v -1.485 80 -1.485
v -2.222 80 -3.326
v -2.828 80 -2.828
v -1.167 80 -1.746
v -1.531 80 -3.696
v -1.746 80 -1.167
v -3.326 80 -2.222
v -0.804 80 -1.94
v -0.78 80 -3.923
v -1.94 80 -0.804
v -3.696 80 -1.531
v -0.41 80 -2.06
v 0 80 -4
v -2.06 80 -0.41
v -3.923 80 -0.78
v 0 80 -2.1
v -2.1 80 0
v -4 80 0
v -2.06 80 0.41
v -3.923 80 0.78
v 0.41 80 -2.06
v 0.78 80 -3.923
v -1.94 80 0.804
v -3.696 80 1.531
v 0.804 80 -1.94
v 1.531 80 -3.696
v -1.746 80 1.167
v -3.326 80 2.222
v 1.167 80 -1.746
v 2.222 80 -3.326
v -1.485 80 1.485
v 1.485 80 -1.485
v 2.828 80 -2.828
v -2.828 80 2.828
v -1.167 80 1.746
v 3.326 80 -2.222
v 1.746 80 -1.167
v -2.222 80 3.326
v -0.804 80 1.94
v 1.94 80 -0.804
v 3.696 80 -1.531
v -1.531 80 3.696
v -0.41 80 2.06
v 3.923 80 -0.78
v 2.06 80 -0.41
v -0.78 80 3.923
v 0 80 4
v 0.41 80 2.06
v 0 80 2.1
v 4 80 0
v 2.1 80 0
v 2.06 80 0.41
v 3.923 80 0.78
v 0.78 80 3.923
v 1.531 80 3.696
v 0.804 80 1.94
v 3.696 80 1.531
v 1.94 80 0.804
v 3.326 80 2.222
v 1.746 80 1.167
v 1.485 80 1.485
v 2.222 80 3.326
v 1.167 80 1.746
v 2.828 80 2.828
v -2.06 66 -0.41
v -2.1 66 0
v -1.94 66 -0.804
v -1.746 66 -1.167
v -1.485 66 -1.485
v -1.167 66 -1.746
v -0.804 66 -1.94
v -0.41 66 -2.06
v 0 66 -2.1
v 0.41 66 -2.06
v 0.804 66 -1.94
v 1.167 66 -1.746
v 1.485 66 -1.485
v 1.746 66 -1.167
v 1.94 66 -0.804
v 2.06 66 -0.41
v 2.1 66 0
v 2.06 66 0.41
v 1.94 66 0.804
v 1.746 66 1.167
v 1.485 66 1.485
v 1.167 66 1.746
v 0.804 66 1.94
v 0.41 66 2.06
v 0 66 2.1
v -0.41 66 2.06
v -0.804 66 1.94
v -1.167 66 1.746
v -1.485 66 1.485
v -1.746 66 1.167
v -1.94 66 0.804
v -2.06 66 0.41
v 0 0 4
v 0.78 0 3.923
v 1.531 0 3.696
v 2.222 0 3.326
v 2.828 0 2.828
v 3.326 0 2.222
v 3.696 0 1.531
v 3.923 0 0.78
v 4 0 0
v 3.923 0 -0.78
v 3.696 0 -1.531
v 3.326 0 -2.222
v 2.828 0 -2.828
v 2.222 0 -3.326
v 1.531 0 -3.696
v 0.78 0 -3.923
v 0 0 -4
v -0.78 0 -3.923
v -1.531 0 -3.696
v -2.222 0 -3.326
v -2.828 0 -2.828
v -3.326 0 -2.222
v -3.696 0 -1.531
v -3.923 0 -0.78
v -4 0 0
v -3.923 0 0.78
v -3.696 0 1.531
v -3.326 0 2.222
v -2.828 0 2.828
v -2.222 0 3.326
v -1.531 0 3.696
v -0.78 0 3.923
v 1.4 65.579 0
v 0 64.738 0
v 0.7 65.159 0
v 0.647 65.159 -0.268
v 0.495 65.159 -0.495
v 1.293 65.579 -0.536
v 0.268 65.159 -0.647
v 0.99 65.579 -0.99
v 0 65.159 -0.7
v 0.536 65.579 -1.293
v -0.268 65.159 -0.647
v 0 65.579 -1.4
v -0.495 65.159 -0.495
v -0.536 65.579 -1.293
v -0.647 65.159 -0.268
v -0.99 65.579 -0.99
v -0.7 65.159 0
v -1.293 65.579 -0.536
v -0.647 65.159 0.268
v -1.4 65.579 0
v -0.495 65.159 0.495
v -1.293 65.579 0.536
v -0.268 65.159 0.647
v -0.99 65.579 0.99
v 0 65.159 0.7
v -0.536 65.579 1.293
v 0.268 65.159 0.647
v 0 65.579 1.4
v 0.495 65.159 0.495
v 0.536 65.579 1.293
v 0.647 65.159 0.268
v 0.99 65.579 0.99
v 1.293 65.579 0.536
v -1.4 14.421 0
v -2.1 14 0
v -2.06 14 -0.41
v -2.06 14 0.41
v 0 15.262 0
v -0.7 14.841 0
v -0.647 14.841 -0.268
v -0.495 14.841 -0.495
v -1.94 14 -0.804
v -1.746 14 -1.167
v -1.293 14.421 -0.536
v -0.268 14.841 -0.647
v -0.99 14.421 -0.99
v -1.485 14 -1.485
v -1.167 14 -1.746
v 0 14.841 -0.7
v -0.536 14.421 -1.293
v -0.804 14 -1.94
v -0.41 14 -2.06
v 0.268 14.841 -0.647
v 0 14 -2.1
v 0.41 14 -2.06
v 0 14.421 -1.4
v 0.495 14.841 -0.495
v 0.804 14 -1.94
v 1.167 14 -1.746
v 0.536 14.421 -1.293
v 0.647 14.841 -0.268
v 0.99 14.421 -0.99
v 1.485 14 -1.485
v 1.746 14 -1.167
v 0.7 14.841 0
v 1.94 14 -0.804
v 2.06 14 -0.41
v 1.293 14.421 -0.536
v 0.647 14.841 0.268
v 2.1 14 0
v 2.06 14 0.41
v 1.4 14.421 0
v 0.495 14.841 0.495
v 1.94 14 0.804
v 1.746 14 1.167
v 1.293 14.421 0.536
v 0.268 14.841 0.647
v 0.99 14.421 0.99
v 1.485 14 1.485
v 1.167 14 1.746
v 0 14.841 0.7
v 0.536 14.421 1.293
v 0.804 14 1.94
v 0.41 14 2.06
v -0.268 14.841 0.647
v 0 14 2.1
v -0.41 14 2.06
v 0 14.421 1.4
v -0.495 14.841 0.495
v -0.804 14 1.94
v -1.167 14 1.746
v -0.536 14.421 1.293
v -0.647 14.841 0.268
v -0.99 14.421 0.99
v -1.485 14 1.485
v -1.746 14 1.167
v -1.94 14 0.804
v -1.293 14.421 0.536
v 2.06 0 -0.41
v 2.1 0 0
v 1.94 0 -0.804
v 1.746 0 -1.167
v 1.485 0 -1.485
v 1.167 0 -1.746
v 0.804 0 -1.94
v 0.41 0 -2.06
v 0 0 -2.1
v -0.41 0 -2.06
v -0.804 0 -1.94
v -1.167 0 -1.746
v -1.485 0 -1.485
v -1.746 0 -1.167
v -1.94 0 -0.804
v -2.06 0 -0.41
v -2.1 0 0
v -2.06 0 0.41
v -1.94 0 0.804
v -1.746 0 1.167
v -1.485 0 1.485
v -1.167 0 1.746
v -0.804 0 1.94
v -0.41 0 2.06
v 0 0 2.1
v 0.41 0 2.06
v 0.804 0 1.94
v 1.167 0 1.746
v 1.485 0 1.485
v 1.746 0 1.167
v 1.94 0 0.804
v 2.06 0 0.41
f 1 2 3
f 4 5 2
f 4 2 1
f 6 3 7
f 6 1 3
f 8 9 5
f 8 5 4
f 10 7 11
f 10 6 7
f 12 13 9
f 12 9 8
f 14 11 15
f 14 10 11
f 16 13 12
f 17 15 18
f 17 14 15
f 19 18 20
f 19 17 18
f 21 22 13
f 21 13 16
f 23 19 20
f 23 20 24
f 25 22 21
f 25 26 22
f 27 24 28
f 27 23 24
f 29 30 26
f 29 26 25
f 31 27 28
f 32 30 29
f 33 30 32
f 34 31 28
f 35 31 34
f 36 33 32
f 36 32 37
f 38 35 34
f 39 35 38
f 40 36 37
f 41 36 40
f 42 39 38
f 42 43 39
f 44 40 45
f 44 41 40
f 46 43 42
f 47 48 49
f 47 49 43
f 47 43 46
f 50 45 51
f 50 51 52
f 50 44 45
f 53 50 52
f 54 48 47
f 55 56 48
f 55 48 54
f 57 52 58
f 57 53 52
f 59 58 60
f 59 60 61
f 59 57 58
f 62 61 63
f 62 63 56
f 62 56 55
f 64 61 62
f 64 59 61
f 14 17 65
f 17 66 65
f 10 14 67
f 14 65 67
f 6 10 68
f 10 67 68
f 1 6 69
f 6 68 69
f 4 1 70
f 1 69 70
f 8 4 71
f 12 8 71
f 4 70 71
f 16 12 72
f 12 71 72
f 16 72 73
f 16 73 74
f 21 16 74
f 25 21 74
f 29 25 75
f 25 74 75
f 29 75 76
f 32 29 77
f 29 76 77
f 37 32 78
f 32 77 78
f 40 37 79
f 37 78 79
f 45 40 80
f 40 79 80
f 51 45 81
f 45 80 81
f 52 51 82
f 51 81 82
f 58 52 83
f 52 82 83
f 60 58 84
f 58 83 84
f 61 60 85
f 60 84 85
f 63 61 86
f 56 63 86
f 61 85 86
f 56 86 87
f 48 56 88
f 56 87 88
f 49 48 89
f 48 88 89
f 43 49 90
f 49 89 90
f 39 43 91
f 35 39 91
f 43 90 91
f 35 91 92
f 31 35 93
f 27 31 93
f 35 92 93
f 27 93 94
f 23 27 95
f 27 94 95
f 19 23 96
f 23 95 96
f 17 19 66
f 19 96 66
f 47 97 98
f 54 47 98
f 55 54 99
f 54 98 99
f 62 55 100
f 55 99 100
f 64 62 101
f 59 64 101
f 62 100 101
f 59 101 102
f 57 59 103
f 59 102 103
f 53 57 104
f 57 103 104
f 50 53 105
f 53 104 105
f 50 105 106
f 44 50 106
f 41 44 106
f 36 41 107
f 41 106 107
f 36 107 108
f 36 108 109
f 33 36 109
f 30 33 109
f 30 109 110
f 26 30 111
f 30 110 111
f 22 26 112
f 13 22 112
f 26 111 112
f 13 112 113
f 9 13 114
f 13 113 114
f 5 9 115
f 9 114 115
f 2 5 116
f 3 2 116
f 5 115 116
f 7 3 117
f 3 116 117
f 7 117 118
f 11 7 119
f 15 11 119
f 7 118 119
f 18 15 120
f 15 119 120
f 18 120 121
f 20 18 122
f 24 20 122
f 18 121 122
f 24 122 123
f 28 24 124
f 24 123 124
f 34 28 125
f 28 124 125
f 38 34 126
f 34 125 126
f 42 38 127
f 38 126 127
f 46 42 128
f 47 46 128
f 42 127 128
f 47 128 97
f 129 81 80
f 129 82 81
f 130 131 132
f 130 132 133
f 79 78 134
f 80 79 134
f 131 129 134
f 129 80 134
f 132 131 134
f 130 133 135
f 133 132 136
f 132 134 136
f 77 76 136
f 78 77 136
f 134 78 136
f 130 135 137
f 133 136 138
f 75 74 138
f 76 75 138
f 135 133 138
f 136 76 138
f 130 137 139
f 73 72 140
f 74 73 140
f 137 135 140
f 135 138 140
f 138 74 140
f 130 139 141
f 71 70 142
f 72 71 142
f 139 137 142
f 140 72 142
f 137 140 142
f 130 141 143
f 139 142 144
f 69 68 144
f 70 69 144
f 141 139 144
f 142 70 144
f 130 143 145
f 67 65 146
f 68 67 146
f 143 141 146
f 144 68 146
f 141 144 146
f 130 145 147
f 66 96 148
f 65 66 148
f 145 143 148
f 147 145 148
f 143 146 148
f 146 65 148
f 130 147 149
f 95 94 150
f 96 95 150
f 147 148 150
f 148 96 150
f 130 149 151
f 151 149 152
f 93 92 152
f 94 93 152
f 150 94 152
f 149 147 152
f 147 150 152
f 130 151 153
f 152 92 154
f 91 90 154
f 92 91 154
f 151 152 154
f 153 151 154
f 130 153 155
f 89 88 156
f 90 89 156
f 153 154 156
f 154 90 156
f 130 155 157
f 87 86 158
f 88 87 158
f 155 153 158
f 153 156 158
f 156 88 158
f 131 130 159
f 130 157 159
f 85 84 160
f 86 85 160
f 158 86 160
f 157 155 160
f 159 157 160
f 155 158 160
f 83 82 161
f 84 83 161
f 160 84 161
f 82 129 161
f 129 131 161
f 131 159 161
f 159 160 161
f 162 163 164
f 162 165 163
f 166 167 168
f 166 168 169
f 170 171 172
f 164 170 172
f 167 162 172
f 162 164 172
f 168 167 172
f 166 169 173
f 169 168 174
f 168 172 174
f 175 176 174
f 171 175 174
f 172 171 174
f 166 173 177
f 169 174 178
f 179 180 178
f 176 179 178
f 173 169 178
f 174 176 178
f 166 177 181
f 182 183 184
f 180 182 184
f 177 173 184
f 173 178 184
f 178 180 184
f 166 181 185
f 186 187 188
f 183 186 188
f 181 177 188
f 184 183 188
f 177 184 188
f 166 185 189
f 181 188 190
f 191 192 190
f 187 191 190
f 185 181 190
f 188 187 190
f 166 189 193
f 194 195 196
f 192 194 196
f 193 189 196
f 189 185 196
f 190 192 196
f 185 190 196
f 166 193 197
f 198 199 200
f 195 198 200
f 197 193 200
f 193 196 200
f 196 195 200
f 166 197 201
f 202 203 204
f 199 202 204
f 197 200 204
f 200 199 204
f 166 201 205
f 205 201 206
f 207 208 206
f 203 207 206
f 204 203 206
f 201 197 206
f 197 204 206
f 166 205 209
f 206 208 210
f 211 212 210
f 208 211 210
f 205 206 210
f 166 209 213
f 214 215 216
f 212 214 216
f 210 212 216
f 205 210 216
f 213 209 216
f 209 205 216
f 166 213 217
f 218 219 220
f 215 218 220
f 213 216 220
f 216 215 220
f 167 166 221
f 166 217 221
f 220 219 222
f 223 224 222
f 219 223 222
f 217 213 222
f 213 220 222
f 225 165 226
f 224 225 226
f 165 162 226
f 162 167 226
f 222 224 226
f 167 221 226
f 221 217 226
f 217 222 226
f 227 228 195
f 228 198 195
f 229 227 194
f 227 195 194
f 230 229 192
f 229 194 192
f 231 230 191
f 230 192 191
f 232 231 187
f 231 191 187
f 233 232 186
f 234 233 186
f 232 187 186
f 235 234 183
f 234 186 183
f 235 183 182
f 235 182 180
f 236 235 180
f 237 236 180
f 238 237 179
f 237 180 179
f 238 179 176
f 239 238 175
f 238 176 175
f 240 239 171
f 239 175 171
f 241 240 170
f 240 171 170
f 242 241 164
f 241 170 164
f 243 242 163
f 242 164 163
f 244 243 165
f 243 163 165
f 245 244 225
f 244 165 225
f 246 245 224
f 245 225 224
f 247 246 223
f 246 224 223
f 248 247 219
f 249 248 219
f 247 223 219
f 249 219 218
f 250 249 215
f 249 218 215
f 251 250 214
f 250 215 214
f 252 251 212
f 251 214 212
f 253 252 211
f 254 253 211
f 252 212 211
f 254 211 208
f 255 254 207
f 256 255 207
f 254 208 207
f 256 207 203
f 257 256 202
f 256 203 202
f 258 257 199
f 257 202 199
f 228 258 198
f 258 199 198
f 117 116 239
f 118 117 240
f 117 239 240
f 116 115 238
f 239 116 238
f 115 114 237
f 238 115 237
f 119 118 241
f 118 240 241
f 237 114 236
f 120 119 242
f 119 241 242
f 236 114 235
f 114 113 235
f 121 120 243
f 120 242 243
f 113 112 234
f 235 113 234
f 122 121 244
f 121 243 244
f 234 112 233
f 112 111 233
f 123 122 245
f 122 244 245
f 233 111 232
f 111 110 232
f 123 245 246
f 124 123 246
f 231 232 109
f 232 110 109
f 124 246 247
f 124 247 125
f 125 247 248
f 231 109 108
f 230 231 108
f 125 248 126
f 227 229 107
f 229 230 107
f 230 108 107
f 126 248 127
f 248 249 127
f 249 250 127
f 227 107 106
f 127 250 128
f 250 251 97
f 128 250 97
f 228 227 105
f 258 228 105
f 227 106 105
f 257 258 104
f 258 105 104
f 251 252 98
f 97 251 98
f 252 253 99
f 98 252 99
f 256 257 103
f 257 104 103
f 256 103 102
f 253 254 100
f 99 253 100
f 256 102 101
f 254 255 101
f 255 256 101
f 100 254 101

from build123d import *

# Parameters (mm, degrees)
BOSS_EXTRUDE1_DEPTH       = 80
BOSS_EXTRUDE1_DEPTH_BACK  = 0.0001
SKETCH1_R                 = 4
M5X0_8_TAPPED_HOLE1_D     = 4.2
M5X0_8_TAPPED_HOLE1_DEPTH = 14
M5X0_8_TAPPED_HOLE1_TIP   = 1.2618073
M5X0_8_TAPPED_HOLE2_D     = 4.2
M5X0_8_TAPPED_HOLE2_DEPTH = 14
M5X0_8_TAPPED_HOLE2_TIP   = 1.2618073


with BuildPart() as part:
    # Sketch1 → Boss-Extrude1 (new, two sides: drawn at the far end of the back side and taken through both)
    with BuildSketch(Plane(origin=(0, 0, 0), x_dir=(1, 0, 0), z_dir=(0, 1, 0)).offset(-BOSS_EXTRUDE1_DEPTH_BACK)):
        with Locations(Location((0, 0, 0), (0, 0, 270))):
            Circle(SKETCH1_R)
    extrude(amount=BOSS_EXTRUDE1_DEPTH + BOSS_EXTRUDE1_DEPTH_BACK)

    # M5x0.8 Tapped Hole1
    with Locations(Plane(origin=(0, 80, 0), x_dir=(1, 0, 0), z_dir=(0, 1, 0))):
        with Locations((0, 0)):
            Hole(M5X0_8_TAPPED_HOLE1_D / 2, depth=M5X0_8_TAPPED_HOLE1_DEPTH)
            with Locations((0, 0, -(M5X0_8_TAPPED_HOLE1_DEPTH + M5X0_8_TAPPED_HOLE1_TIP / 2))):  # 118° drill point
                Cone(0, M5X0_8_TAPPED_HOLE1_D / 2, M5X0_8_TAPPED_HOLE1_TIP, mode=Mode.SUBTRACT)

    # M5x0.8 Tapped Hole2
    with Locations(Plane(origin=(0, -0.0001, 0), x_dir=(-1, 0, 0), z_dir=(0, -1, 0))):
        with Locations((0, 0)):
            Hole(M5X0_8_TAPPED_HOLE2_D / 2, depth=M5X0_8_TAPPED_HOLE2_DEPTH)
            with Locations((0, 0, -(M5X0_8_TAPPED_HOLE2_DEPTH + M5X0_8_TAPPED_HOLE2_TIP / 2))):  # 118° drill point
                Cone(0, M5X0_8_TAPPED_HOLE2_D / 2, M5X0_8_TAPPED_HOLE2_TIP, mode=Mode.SUBTRACT)


solid = part.part
